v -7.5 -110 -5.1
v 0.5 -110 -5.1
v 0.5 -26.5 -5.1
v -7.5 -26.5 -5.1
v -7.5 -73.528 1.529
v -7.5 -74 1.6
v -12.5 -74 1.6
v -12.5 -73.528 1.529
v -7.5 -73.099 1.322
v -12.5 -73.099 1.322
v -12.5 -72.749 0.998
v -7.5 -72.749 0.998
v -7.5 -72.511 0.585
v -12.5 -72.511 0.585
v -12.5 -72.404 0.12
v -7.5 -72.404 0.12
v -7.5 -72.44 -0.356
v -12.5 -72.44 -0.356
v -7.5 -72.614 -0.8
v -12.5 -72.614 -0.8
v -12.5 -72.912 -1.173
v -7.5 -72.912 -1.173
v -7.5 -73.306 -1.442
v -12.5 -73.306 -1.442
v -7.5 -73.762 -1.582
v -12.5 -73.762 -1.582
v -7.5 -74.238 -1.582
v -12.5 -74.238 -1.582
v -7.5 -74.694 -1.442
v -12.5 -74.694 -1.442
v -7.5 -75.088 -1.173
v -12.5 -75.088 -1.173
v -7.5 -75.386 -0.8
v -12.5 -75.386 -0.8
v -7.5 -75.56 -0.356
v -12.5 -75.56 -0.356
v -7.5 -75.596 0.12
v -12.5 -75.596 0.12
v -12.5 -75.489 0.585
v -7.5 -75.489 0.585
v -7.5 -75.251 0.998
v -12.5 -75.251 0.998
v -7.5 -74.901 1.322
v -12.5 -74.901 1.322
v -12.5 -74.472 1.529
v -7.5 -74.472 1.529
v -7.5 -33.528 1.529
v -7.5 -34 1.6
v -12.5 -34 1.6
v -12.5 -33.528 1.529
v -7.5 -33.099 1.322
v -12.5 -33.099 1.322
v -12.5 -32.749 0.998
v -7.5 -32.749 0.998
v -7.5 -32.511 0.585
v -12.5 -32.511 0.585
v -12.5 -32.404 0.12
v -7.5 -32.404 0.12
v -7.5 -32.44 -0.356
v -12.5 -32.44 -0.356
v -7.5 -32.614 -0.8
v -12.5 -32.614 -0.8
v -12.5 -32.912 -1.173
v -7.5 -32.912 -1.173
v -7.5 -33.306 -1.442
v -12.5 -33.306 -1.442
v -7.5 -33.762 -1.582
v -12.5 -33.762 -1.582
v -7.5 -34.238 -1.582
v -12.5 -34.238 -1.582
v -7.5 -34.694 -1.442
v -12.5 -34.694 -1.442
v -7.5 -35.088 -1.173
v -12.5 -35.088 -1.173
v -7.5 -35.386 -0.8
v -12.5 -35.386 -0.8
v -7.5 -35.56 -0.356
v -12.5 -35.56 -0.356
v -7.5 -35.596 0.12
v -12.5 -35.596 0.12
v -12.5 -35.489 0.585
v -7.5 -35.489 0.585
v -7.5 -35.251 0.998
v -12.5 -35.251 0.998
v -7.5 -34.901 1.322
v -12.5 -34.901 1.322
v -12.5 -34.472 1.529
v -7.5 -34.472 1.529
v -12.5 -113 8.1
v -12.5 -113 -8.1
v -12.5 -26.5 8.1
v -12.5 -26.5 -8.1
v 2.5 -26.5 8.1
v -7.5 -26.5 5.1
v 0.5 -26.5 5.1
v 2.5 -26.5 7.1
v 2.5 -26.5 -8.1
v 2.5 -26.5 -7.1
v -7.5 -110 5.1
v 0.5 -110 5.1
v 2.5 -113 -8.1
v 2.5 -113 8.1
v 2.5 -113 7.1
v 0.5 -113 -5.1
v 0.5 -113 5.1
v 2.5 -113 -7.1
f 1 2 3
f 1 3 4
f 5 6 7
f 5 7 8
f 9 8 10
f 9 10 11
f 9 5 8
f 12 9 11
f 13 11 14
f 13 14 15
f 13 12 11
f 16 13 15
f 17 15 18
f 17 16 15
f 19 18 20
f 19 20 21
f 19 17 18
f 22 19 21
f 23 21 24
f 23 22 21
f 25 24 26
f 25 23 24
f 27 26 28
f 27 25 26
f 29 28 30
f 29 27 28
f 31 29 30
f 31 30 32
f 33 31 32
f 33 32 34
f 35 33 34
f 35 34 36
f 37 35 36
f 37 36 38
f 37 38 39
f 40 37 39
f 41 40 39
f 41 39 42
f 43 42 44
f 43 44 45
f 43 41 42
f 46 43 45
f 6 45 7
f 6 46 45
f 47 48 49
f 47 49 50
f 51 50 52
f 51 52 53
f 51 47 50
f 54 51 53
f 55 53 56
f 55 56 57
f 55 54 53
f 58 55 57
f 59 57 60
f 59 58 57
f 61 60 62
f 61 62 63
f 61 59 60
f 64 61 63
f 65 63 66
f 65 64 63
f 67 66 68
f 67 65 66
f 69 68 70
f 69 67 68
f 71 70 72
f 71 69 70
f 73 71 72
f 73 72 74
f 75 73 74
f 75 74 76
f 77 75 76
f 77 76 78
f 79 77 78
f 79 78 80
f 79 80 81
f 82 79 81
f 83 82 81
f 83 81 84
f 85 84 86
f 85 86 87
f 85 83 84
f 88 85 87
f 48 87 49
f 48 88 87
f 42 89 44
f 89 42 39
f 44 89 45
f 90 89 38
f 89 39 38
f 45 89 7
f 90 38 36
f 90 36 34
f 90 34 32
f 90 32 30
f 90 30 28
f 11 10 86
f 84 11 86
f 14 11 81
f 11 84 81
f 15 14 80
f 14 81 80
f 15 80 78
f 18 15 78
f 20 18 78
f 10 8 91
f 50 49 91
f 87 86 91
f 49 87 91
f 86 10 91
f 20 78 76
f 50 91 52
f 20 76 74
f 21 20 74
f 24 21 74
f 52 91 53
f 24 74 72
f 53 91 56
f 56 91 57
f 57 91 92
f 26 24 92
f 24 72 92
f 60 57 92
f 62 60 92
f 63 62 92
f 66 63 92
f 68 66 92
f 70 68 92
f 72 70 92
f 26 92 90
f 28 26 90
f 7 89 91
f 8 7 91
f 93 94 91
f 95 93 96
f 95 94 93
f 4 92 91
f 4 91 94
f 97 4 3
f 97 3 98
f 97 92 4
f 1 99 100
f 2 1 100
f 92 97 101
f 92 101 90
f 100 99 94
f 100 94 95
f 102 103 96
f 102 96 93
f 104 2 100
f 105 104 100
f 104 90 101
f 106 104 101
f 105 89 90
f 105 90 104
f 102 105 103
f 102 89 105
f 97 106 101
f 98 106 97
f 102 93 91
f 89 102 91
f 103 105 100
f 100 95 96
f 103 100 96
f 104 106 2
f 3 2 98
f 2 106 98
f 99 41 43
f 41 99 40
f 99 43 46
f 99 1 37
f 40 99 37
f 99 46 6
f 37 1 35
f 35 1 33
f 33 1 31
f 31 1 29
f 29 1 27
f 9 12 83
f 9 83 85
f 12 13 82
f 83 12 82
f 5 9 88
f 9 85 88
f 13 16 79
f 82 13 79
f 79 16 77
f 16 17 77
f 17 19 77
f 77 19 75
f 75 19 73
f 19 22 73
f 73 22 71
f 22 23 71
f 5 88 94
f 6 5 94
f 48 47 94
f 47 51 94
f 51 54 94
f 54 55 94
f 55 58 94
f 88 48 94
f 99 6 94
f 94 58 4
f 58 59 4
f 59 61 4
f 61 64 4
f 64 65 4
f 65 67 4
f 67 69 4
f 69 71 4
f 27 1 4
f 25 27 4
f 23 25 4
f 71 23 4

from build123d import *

# Parameters (mm, degrees)
SKETCH_1_W            = 10
SKETCH_1_H            = 83.5
SKETCH_1_R            = 1.6
EXTRUDE_1_DEPTH       = 5
MOVE_START            = -5.1
MOVE_FACE_1_OUTLINE_W = 5
MOVE_FACE_1_OUTLINE_H = 83.5
MOVE_FACE_1_DEPTH     = 0.1
SKETCH_2_W            = 15
SKETCH_2_H            = 5
EXTRUDE_2_DEPTH       = 3
MOVE_START_2          = 5
MOVE_FACE_2_OUTLINE_W = 5
MOVE_FACE_2_OUTLINE_H = 83.5
MOVE_FACE_2_DEPTH     = 0.1
CHAMFER_1_SIZE        = 2
SKETCH_3_W            = 8
SKETCH_3_H            = 10.2
EXTRUDE_3_DEPTH       = 3
EXTRUDE_4_DEPTH       = 73.5


# Read off the part's stored shape, not the designer's step: 面の移動1, 面の移動2
with BuildPart() as part:
    # ｽｹｯﾁ1 → ﾎﾞｽ - 押し出し1 (new body)
    with BuildSketch(Plane.ZY.offset(7.5)):
        with Locations((0, -68.25)):
            Rectangle(SKETCH_1_W, SKETCH_1_H)
        with Locations((0, -74)):
            Circle(SKETCH_1_R, mode=Mode.SUBTRACT)
        with Locations((0, -34)):
            Circle(SKETCH_1_R, mode=Mode.SUBTRACT)
    extrude(amount=EXTRUDE_1_DEPTH)

    # Move Face 1 outline → Move Face 1 (add)
    with BuildSketch(Plane.XY.offset(MOVE_START)):
        with Locations((-10, -68.25)):
            Rectangle(MOVE_FACE_1_OUTLINE_W, MOVE_FACE_1_OUTLINE_H)
    extrude(amount=MOVE_FACE_1_DEPTH)

    # ｽｹｯﾁ2 → ﾎﾞｽ - 押し出し2 (add)
    with BuildSketch(Plane(origin=(0, 0, -5.1), x_dir=(-1, 0, 0), z_dir=(0, 0, -1))):
        with Locations((5, -107.5)):
            Rectangle(SKETCH_2_W, SKETCH_2_H)
        with Locations((5, -29)):
            Rectangle(SKETCH_2_W, SKETCH_2_H)
        with Locations((5, -68.25)):
            Rectangle(SKETCH_2_W, SKETCH_2_H)
    extrude_2 = extrude(amount=EXTRUDE_2_DEPTH)

    # Move Face 2 outline → Move Face 2 (add)
    with BuildSketch(Plane.XY.offset(MOVE_START_2)):
        with Locations((-10, -68.25)):
            Rectangle(MOVE_FACE_2_OUTLINE_W, MOVE_FACE_2_OUTLINE_H)
    extrude(amount=MOVE_FACE_2_DEPTH)

    # ﾐﾗｰ2: ﾎﾞｽ - 押し出し2 across plane
    add(extrude_2.mirror(Plane.XY))

    # 面取り1
    chamfer_1_edges = [part.edges().sort_by_distance(p)[0] for p in [
        (2.5, -107.5, -5.1),
        (2.5, -29, -5.1),
        (2.5, -68.25, -5.1),
        (2.5, -107.5, 5.1),
        (2.5, -29, 5.1),
        (2.5, -68.25, 5.1),
    ]]
    chamfer(chamfer_1_edges, length=CHAMFER_1_SIZE)

    # ｽｹｯﾁ3 → ﾎﾞｽ - 押し出し3 (add)
    with BuildSketch(Plane.XZ.offset(110)):
        Polygon((-7.5, -5.1), (-7.5, 5.1), (0.5, 5.1), (2.5, 7.1), (2.5, 8.1), (-12.5, 8.1), (-12.5, -8.1), (2.5, -8.1), (2.5, -7.1), (0.5, -5.1), align=None)
        with Locations((-3.5, 0)):
            Rectangle(SKETCH_3_W, SKETCH_3_H)
    extrude(amount=EXTRUDE_3_DEPTH)

    # ｽｹｯﾁ4 → ﾎﾞｽ - 押し出し4 (add)
    with BuildSketch(Plane.XZ.offset(31.5)):
        Polygon((-7.5, 5.1), (0.5, 5.1), (2.5, 7.1), (2.5, 8.1), (-12.5, 8.1), (-12.5, 5.1), align=None)
        Polygon((2.5, -8.1), (2.5, -7.1), (0.5, -5.1), (-7.5, -5.1), (-12.5, -5.1), (-12.5, -8.1), align=None)
    extrude(amount=EXTRUDE_4_DEPTH)


solid = part.part
